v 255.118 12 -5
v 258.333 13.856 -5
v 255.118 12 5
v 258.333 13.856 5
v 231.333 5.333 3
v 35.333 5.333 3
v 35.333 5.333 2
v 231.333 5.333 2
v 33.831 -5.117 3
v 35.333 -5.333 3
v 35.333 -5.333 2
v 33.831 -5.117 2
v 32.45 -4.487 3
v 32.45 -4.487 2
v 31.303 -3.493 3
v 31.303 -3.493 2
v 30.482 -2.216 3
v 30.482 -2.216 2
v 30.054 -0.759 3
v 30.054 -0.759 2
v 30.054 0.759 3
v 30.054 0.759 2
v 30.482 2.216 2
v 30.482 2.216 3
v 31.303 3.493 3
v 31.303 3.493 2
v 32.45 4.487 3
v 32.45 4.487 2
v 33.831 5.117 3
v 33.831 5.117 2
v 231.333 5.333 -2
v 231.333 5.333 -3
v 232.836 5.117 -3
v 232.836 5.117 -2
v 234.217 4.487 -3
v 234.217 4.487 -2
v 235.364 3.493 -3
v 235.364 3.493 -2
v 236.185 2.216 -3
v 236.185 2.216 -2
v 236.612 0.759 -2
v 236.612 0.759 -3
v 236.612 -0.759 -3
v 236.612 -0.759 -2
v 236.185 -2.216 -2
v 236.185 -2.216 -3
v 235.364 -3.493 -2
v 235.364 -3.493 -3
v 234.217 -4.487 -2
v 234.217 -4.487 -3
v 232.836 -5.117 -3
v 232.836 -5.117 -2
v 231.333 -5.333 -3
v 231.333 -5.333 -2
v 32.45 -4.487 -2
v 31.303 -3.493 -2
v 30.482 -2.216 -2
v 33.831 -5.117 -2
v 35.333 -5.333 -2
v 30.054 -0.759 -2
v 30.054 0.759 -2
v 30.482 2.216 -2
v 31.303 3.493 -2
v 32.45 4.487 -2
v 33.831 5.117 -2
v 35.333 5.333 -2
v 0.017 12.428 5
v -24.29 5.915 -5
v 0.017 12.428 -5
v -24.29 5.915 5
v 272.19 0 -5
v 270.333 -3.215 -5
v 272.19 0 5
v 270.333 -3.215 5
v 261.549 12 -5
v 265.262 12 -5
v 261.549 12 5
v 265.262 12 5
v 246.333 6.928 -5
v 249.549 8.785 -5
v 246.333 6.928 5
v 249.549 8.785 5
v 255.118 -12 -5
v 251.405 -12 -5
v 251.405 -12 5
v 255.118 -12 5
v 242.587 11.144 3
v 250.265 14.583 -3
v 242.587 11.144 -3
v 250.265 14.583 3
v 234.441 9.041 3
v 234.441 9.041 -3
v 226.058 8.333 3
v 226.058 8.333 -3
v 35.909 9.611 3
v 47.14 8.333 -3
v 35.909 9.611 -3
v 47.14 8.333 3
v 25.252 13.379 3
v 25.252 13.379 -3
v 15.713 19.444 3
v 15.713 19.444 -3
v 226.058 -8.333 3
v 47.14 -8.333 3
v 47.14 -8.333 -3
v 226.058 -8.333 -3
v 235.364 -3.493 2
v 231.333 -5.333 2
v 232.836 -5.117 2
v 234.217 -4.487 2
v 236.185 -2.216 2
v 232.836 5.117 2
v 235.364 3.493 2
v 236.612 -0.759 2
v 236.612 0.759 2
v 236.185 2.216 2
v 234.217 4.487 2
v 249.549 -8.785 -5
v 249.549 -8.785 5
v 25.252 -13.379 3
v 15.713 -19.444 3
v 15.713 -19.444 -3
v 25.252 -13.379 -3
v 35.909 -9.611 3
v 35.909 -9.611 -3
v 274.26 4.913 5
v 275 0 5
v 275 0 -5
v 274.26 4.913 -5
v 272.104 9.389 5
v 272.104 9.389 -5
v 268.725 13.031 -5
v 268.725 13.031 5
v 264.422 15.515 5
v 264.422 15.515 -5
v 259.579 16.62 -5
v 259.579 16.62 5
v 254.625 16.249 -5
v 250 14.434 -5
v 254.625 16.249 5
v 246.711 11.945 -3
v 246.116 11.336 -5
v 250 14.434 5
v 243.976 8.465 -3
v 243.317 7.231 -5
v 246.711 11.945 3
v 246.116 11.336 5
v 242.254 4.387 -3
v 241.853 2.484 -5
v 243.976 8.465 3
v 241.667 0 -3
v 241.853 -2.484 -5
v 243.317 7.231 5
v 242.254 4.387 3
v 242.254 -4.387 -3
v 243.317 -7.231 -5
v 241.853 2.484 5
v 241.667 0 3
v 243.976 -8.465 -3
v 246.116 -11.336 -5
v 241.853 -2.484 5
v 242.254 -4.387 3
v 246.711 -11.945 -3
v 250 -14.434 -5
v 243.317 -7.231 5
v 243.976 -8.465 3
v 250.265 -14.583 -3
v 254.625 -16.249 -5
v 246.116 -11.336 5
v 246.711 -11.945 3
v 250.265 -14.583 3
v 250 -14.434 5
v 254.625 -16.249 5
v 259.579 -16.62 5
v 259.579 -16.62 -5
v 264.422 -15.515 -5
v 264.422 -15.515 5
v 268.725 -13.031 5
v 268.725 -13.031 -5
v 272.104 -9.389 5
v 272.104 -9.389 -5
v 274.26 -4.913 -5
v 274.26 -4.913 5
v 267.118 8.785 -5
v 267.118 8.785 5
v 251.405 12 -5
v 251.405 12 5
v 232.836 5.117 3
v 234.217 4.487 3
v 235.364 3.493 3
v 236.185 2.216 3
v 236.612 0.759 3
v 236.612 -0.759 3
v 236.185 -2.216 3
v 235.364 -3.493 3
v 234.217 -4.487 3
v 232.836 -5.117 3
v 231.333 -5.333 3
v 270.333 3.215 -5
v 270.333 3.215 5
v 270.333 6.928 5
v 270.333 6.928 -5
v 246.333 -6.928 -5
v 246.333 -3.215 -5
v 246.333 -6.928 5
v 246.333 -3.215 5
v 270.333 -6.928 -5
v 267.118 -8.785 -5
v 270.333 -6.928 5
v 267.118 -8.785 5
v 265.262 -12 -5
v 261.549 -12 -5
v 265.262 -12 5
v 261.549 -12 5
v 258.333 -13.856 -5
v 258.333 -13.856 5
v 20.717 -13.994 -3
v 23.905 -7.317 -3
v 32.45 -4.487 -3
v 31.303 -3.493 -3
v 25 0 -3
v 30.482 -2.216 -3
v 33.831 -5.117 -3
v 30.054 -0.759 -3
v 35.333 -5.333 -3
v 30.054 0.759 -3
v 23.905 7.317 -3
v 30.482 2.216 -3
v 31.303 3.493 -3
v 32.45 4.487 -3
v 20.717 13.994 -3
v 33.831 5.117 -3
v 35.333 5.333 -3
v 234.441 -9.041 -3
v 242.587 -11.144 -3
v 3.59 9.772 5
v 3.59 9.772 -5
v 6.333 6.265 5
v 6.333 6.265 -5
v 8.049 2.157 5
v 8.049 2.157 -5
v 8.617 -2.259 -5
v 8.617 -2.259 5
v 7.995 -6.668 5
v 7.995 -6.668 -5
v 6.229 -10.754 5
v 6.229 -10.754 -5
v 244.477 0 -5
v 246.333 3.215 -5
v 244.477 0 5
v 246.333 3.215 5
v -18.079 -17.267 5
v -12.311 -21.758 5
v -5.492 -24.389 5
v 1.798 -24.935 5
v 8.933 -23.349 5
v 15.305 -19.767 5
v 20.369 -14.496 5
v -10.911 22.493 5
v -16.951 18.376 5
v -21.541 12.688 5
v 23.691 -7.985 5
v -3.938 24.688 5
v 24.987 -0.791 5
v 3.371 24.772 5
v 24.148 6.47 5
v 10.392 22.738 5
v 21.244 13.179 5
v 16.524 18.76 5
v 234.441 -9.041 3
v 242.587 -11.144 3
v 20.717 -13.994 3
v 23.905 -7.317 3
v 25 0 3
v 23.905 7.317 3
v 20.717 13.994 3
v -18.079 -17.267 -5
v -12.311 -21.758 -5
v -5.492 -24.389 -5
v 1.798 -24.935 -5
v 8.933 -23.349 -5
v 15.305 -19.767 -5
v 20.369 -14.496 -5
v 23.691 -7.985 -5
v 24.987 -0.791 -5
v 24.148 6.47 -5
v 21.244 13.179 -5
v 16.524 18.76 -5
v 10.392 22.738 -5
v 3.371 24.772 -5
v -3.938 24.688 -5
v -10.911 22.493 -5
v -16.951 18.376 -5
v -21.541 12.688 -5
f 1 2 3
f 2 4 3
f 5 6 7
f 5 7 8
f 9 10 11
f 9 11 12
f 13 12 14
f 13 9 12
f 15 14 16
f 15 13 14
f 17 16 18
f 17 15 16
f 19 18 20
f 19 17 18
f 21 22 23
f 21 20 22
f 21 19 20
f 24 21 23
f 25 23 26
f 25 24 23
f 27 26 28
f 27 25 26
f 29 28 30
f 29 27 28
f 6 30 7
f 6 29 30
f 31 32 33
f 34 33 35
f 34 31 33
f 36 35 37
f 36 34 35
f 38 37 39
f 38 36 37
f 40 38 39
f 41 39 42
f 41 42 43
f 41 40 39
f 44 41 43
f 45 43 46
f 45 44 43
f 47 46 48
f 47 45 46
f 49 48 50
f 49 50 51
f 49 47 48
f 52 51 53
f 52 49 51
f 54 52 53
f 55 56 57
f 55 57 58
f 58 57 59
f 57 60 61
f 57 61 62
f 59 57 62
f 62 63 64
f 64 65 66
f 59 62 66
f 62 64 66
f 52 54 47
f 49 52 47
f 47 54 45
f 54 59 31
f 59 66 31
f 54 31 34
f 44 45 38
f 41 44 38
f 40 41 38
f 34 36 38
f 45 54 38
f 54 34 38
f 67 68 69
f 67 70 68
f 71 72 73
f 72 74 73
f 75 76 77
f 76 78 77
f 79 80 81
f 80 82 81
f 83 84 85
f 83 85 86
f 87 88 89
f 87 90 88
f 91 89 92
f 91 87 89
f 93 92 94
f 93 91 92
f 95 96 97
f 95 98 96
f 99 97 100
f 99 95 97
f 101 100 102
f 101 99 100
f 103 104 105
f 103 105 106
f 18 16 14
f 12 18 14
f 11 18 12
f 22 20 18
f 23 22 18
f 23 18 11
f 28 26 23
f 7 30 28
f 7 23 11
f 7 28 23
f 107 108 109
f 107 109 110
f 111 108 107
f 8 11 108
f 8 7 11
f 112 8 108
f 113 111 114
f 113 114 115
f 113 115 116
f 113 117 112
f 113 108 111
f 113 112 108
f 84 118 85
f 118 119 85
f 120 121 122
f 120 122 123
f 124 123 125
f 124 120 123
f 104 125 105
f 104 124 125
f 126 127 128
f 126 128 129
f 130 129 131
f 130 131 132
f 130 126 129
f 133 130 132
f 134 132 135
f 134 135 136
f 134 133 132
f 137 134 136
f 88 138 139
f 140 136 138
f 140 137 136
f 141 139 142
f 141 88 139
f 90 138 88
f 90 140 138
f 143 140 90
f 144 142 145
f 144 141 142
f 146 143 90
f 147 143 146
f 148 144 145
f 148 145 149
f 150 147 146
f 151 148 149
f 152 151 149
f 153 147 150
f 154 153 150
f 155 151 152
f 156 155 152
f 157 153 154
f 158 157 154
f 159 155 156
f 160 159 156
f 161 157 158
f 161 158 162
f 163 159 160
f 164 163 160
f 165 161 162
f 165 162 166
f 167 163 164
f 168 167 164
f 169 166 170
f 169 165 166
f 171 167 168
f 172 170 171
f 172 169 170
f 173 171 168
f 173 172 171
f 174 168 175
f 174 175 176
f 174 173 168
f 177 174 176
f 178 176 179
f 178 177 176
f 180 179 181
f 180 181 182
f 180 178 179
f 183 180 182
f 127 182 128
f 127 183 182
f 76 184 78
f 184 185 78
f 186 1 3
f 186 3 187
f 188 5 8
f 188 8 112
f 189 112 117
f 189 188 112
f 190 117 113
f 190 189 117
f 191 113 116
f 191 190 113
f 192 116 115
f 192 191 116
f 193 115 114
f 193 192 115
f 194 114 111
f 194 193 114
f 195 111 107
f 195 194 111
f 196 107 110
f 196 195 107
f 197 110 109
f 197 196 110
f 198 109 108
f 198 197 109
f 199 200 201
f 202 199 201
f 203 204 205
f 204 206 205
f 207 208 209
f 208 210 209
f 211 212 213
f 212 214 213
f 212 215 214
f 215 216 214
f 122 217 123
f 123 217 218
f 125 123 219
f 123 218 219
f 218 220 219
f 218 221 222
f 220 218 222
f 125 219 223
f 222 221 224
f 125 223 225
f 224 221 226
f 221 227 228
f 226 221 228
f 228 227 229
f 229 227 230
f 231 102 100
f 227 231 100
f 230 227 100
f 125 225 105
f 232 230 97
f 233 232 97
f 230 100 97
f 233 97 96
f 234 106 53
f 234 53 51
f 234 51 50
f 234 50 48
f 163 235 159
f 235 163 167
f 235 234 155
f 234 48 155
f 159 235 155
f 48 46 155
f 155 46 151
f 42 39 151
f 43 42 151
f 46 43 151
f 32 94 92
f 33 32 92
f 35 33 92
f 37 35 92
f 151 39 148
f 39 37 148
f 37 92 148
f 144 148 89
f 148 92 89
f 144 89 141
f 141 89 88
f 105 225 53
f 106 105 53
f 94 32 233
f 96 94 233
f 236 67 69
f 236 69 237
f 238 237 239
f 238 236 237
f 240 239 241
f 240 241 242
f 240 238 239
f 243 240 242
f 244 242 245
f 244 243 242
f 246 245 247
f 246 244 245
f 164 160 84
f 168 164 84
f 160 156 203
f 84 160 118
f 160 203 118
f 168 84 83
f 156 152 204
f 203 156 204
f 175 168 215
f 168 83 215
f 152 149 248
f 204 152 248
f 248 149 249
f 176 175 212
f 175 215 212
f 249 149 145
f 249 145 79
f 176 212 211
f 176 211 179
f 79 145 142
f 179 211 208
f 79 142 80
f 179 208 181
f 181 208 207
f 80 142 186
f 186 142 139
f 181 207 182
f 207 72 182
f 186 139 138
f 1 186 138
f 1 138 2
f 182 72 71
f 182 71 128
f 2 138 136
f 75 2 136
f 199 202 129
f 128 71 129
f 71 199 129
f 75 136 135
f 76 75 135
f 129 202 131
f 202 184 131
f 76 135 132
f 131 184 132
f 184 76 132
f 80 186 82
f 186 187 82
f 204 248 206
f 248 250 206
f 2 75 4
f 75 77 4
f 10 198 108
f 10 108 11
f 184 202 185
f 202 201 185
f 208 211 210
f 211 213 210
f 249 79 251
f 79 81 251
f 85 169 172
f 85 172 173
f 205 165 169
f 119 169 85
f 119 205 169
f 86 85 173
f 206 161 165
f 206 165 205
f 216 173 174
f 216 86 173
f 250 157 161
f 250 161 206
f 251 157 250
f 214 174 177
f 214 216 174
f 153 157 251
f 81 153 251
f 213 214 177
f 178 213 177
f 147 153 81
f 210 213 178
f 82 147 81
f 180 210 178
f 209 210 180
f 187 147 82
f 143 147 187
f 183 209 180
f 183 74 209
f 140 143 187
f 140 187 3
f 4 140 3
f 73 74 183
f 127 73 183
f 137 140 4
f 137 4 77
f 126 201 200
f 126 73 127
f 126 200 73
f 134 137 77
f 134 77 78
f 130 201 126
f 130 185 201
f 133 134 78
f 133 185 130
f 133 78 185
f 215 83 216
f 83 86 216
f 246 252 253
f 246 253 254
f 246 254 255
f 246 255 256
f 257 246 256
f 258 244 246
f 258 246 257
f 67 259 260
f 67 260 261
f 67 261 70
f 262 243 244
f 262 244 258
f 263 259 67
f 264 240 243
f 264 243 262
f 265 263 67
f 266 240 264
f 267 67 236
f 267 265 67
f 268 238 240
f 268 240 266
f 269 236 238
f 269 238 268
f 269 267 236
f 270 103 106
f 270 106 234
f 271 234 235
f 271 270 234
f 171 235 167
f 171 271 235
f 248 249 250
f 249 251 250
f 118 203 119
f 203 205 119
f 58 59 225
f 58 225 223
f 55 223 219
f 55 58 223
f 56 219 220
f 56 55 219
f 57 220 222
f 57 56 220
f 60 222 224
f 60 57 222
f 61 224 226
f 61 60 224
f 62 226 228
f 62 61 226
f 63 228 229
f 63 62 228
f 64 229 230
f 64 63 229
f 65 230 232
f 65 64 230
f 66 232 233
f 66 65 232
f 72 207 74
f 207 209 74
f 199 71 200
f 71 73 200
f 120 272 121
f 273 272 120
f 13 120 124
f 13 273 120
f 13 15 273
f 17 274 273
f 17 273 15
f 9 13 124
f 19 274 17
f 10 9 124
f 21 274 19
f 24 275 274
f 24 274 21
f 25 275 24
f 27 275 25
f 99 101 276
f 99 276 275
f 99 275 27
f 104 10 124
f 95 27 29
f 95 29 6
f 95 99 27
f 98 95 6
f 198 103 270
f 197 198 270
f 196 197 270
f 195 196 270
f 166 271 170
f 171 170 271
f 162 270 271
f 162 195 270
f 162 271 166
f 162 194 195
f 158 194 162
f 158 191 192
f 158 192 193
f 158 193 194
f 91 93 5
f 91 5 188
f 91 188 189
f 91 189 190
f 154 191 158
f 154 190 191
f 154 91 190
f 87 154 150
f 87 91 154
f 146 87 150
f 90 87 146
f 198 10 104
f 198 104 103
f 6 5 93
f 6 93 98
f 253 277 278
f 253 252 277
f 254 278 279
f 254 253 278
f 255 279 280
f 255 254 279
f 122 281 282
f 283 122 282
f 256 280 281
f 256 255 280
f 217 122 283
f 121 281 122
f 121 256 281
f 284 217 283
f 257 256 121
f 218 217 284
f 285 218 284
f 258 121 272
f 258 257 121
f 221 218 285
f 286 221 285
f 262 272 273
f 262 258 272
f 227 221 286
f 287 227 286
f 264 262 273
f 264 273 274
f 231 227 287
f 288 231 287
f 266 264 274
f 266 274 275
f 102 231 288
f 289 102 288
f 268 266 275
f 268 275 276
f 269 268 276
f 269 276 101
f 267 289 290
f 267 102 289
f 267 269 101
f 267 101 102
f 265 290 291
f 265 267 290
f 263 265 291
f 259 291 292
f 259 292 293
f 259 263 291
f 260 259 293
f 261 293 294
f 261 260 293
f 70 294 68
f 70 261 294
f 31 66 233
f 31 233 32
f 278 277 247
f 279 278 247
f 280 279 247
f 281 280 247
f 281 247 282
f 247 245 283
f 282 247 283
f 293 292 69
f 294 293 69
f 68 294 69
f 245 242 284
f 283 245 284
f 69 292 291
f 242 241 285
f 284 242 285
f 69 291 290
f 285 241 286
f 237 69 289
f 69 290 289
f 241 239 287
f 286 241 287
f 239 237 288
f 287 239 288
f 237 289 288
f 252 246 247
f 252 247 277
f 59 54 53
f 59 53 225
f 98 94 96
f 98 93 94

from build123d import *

# Parameters (mm, degrees)
BOSS_EXTRUDE1_DEPTH   = 5
SKETCH1_R             = 16.666666667
BOSS_EXTRUDE1_2_DEPTH = 5
BOSS_EXTRUDE2_DEPTH   = 3
BOSS_EXTRUDE3_DEPTH   = 2


with BuildPart() as part:
    # Sketch1 → Boss-Extrude1 (new, symmetric)
    with BuildSketch(Plane.XY):
        with BuildLine():
            ThreePointArc((-18.078578687, -17.267454724), (24.148145657, 6.470476128), (-24.290235769, 5.914765107))
            Line((-24.290235769, 5.914765107), (0.016914075, 12.427846278))
            ThreePointArc((0.016914075, 12.427846278), (8.049381886, 2.156825376), (6.228571158, -10.754373553))
            Line((6.228571158, -10.754373553), (-18.078578687, -17.267454724))
        make_face()
    extrude(amount=BOSS_EXTRUDE1_DEPTH, both=True)



with BuildPart() as body_2:
    # Sketch1 → Boss-Extrude1 2 (new, symmetric)
    with BuildSketch(Plane.XY):
        with Locations((258.333333333, 0)):
            Circle(SKETCH1_R)
        Polygon((251.405130103, 12), (255.117943024, 12), (258.333333333, 13.856406461), (261.548723643, 12), (265.261536564, 12), (267.117943024, 8.784609691), (270.333333333, 6.92820323), (270.333333333, 3.215390309), (272.189739794, 0), (270.333333333, -3.215390309), (270.333333333, -6.92820323), (267.117943024, -8.784609691), (265.261536564, -12), (261.548723643, -12), (258.333333333, -13.856406461), (255.117943024, -12), (251.405130103, -12), (249.548723643, -8.784609691), (246.333333333, -6.92820323), (246.333333333, -3.215390309), (244.476926873, 0), (246.333333333, 3.215390309), (246.333333333, 6.92820323), (249.548723643, 8.784609691), align=None, mode=Mode.SUBTRACT)
    extrude(amount=BOSS_EXTRUDE1_2_DEPTH, both=True)


with BuildPart() as part_1:
    add(part.part)

    add(body_2.part)  # Boss-Extrude2 merges body 2
    # Sketch1<3> → Boss-Extrude2 (add, symmetric)
    with BuildSketch(Plane.XY):
        with BuildLine():
            ThreePointArc((47.140452079, 8.333333333), (30.473785412, 11.192881254), (15.713484026, 19.444444444))
            ThreePointArc((15.713484026, 19.444444444), (25, 0), (15.713484026, -19.444444444))
            ThreePointArc((15.713484026, -19.444444444), (30.473785412, -11.192881254), (47.140452079, -8.333333333))
            Line((47.140452079, -8.333333333), (226.058472115, -8.333333333))
            ThreePointArc((226.058472115, -8.333333333), (238.558472115, -9.921041506), (250.264618029, -14.583333333))
            ThreePointArc((250.264618029, -14.583333333), (241.666666667, 0), (250.264618029, 14.583333333))
            ThreePointArc((250.264618029, 14.583333333), (238.558472115, 9.921041506), (226.058472115, 8.333333333))
            Line((226.058472115, 8.333333333), (47.140452079, 8.333333333))
        make_face()
        with BuildLine():
            ThreePointArc((35.333333333, -5.333333333), (30, 0), (35.333333333, 5.333333333))
            Line((35.333333333, 5.333333333), (231.333333333, 5.333333333))
            ThreePointArc((231.333333333, 5.333333333), (236.666666667, 0), (231.333333333, -5.333333333))
            Line((231.333333333, -5.333333333), (35.333333333, -5.333333333))
        make_face(mode=Mode.SUBTRACT)
    extrude(amount=BOSS_EXTRUDE2_DEPTH, both=True)

    # Sketch1<4> → Boss-Extrude3 (add, symmetric)
    with BuildSketch(Plane.XY):
        with BuildLine():
            Line((231.333333333, 5.333333333), (35.333333333, 5.333333333))
            ThreePointArc((35.333333333, 5.333333333), (30, 0), (35.333333333, -5.333333333))
            Line((35.333333333, -5.333333333), (231.333333333, -5.333333333))
            ThreePointArc((231.333333333, -5.333333333), (236.666666667, 0), (231.333333333, 5.333333333))
        make_face()
    extrude(amount=BOSS_EXTRUDE3_DEPTH, both=True)


solid = part_1.part
